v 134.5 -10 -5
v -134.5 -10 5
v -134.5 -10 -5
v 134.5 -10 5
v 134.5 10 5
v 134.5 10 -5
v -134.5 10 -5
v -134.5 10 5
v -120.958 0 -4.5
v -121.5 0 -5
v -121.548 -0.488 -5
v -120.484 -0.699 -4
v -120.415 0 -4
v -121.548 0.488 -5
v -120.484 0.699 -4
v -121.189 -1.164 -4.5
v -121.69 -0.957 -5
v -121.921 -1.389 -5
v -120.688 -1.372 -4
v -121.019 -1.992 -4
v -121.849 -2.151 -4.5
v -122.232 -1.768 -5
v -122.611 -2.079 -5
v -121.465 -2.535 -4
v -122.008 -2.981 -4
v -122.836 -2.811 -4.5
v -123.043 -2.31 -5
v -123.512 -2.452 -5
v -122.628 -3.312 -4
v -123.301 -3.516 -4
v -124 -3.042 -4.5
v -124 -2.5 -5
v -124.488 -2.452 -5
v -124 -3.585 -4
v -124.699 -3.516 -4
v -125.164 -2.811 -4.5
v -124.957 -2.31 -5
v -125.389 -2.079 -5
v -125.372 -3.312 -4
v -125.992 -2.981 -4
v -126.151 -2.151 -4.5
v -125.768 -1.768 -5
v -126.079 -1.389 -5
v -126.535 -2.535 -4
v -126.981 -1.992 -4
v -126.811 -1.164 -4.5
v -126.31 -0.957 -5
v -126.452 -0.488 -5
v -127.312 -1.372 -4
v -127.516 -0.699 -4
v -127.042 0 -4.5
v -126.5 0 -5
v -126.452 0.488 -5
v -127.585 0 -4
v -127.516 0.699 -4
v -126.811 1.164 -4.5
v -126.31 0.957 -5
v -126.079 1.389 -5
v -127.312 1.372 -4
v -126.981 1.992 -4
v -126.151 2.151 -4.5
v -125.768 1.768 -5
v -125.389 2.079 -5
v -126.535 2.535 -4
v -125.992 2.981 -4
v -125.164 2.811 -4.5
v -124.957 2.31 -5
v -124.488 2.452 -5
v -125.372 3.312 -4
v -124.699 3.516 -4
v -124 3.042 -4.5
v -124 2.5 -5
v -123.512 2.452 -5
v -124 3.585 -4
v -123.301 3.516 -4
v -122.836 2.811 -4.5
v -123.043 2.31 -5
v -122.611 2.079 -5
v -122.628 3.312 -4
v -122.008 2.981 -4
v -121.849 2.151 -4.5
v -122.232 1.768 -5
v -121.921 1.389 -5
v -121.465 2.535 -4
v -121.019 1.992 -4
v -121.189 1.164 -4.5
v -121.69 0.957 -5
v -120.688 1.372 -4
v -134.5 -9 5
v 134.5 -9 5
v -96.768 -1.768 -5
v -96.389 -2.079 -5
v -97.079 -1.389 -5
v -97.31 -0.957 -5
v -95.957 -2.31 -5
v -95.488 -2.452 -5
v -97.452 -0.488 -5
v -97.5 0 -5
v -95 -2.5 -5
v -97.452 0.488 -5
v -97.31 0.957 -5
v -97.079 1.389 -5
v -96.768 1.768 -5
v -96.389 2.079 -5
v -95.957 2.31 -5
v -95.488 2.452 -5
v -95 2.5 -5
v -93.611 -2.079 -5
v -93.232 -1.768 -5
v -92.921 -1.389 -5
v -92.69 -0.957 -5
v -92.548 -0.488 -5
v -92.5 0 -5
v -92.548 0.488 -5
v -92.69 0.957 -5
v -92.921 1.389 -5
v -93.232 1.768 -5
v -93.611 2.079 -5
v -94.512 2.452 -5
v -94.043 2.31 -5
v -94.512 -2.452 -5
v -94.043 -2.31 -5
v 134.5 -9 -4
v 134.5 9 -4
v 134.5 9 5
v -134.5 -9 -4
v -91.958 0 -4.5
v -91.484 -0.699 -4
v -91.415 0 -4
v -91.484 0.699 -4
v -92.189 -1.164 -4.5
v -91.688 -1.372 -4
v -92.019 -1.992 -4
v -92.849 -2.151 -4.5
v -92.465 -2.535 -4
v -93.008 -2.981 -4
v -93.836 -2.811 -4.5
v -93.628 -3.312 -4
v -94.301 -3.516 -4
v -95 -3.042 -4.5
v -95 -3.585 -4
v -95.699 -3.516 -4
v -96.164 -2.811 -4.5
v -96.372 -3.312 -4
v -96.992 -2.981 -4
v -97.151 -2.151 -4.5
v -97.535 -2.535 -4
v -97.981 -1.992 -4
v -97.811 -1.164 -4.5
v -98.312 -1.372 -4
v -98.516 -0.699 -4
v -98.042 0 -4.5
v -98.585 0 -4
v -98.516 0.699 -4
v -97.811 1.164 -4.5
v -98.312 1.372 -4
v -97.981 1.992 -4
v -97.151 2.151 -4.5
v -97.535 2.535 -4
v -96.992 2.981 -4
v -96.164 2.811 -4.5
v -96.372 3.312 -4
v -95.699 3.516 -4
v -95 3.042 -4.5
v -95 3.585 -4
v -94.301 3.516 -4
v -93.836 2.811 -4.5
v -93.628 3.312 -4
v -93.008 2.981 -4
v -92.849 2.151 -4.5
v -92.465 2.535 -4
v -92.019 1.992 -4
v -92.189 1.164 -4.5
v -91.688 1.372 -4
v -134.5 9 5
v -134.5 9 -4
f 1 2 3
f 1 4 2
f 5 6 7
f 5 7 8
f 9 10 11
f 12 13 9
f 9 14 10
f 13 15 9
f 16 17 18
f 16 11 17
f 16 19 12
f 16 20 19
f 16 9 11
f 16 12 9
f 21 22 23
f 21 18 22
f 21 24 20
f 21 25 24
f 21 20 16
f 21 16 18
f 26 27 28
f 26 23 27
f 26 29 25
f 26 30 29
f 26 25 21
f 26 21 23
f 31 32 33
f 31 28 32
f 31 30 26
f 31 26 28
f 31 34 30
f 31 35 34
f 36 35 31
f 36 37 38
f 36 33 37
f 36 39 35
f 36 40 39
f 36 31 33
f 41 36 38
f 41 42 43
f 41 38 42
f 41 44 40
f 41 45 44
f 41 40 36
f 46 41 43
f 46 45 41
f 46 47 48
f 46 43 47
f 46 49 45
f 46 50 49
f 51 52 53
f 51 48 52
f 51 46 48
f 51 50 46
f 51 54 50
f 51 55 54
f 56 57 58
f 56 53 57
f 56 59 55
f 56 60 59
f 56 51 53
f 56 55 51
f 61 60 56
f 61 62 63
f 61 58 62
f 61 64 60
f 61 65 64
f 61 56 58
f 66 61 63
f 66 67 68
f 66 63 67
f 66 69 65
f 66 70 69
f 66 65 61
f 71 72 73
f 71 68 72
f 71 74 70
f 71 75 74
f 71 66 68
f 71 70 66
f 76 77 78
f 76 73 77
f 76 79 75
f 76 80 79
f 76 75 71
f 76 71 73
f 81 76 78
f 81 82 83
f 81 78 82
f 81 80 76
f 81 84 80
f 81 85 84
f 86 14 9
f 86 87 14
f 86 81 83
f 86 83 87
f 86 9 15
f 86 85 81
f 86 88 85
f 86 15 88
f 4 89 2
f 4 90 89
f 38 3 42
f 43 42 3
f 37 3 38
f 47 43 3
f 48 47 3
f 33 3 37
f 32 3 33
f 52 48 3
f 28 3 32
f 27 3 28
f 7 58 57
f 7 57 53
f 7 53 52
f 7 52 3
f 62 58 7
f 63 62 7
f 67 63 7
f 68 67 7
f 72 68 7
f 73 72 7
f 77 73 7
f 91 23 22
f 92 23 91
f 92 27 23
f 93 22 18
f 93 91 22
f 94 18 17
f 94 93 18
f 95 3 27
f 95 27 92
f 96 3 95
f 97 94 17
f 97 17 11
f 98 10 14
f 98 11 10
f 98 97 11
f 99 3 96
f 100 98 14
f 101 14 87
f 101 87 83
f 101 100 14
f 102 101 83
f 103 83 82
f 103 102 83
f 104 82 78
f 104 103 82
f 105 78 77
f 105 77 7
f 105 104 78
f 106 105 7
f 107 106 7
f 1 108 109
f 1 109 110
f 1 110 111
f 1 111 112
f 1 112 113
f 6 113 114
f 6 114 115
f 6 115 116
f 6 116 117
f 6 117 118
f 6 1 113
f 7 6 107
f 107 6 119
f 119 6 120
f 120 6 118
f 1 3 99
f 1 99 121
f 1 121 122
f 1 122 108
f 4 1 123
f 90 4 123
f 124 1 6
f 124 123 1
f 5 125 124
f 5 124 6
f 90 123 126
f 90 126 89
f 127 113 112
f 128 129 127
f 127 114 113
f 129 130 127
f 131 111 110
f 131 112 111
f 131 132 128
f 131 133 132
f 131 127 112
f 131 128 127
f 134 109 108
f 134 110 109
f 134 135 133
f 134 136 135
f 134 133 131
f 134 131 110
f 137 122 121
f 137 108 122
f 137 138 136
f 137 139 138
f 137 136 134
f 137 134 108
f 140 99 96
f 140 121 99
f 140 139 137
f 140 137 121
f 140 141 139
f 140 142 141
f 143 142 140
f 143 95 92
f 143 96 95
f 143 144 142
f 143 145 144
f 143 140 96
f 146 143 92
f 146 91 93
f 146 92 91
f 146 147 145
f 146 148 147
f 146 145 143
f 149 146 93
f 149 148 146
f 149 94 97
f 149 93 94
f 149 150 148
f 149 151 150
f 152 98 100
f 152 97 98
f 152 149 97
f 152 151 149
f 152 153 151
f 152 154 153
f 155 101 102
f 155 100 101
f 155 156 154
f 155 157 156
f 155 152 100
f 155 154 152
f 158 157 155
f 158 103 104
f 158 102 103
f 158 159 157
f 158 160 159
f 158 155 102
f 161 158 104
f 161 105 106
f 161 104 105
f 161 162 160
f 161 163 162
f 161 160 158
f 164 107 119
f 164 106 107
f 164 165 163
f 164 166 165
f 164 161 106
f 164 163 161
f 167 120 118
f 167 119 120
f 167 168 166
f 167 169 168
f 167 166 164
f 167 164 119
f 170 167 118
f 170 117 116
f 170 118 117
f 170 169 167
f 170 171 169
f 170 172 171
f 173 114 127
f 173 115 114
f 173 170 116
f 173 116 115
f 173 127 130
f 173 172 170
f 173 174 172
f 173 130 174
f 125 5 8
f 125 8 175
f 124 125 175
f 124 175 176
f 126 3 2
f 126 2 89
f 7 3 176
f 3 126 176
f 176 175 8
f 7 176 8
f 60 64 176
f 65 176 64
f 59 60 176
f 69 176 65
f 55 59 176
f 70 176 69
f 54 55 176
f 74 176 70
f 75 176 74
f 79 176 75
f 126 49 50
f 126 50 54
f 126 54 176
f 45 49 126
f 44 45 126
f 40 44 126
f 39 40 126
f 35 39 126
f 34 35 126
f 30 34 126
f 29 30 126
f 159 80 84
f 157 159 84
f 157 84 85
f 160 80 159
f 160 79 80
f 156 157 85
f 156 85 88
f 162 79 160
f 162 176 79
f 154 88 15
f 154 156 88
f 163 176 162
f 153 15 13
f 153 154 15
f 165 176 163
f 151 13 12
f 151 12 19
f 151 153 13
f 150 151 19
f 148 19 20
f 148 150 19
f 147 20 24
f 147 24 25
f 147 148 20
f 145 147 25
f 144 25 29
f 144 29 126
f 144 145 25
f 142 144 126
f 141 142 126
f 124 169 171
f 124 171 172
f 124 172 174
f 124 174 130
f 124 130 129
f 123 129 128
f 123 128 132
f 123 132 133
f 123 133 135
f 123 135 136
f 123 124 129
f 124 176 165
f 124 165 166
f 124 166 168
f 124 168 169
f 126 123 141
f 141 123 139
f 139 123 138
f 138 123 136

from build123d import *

# Parameters (mm, degrees)
F1_DEPTH      = 134.5
F1_DEPTH_BACK = 134.5
F2_R          = 2.5
F3_DEPTH      = 1
F3_TAPER      = -47.3248299171


with BuildPart() as f1:
    # F0 (on Right) → F1 (new body, two sides)
    with BuildSketch(Plane.YZ) as f1_sk:
        Polygon((-10, -5), (10, -5), (10, 5), (9, 5), (9, -4), (-9, -4), (-9, 5), (-10, 5), align=None)
    extrude(amount=F1_DEPTH)
    extrude(f1_sk.sketch, amount=-F1_DEPTH_BACK)

    # F2 (on face) → F3 (cut)
    with BuildSketch(Plane(origin=(0, 0, -5), x_dir=(1, 0, 0), z_dir=(0, 0, -1))):
        with Locations((-124, 0)):
            Circle(F2_R)
        with Locations((-95, 0)):
            Circle(F2_R)
    extrude(amount=-F3_DEPTH, taper=F3_TAPER, mode=Mode.SUBTRACT)


solid = f1.part
